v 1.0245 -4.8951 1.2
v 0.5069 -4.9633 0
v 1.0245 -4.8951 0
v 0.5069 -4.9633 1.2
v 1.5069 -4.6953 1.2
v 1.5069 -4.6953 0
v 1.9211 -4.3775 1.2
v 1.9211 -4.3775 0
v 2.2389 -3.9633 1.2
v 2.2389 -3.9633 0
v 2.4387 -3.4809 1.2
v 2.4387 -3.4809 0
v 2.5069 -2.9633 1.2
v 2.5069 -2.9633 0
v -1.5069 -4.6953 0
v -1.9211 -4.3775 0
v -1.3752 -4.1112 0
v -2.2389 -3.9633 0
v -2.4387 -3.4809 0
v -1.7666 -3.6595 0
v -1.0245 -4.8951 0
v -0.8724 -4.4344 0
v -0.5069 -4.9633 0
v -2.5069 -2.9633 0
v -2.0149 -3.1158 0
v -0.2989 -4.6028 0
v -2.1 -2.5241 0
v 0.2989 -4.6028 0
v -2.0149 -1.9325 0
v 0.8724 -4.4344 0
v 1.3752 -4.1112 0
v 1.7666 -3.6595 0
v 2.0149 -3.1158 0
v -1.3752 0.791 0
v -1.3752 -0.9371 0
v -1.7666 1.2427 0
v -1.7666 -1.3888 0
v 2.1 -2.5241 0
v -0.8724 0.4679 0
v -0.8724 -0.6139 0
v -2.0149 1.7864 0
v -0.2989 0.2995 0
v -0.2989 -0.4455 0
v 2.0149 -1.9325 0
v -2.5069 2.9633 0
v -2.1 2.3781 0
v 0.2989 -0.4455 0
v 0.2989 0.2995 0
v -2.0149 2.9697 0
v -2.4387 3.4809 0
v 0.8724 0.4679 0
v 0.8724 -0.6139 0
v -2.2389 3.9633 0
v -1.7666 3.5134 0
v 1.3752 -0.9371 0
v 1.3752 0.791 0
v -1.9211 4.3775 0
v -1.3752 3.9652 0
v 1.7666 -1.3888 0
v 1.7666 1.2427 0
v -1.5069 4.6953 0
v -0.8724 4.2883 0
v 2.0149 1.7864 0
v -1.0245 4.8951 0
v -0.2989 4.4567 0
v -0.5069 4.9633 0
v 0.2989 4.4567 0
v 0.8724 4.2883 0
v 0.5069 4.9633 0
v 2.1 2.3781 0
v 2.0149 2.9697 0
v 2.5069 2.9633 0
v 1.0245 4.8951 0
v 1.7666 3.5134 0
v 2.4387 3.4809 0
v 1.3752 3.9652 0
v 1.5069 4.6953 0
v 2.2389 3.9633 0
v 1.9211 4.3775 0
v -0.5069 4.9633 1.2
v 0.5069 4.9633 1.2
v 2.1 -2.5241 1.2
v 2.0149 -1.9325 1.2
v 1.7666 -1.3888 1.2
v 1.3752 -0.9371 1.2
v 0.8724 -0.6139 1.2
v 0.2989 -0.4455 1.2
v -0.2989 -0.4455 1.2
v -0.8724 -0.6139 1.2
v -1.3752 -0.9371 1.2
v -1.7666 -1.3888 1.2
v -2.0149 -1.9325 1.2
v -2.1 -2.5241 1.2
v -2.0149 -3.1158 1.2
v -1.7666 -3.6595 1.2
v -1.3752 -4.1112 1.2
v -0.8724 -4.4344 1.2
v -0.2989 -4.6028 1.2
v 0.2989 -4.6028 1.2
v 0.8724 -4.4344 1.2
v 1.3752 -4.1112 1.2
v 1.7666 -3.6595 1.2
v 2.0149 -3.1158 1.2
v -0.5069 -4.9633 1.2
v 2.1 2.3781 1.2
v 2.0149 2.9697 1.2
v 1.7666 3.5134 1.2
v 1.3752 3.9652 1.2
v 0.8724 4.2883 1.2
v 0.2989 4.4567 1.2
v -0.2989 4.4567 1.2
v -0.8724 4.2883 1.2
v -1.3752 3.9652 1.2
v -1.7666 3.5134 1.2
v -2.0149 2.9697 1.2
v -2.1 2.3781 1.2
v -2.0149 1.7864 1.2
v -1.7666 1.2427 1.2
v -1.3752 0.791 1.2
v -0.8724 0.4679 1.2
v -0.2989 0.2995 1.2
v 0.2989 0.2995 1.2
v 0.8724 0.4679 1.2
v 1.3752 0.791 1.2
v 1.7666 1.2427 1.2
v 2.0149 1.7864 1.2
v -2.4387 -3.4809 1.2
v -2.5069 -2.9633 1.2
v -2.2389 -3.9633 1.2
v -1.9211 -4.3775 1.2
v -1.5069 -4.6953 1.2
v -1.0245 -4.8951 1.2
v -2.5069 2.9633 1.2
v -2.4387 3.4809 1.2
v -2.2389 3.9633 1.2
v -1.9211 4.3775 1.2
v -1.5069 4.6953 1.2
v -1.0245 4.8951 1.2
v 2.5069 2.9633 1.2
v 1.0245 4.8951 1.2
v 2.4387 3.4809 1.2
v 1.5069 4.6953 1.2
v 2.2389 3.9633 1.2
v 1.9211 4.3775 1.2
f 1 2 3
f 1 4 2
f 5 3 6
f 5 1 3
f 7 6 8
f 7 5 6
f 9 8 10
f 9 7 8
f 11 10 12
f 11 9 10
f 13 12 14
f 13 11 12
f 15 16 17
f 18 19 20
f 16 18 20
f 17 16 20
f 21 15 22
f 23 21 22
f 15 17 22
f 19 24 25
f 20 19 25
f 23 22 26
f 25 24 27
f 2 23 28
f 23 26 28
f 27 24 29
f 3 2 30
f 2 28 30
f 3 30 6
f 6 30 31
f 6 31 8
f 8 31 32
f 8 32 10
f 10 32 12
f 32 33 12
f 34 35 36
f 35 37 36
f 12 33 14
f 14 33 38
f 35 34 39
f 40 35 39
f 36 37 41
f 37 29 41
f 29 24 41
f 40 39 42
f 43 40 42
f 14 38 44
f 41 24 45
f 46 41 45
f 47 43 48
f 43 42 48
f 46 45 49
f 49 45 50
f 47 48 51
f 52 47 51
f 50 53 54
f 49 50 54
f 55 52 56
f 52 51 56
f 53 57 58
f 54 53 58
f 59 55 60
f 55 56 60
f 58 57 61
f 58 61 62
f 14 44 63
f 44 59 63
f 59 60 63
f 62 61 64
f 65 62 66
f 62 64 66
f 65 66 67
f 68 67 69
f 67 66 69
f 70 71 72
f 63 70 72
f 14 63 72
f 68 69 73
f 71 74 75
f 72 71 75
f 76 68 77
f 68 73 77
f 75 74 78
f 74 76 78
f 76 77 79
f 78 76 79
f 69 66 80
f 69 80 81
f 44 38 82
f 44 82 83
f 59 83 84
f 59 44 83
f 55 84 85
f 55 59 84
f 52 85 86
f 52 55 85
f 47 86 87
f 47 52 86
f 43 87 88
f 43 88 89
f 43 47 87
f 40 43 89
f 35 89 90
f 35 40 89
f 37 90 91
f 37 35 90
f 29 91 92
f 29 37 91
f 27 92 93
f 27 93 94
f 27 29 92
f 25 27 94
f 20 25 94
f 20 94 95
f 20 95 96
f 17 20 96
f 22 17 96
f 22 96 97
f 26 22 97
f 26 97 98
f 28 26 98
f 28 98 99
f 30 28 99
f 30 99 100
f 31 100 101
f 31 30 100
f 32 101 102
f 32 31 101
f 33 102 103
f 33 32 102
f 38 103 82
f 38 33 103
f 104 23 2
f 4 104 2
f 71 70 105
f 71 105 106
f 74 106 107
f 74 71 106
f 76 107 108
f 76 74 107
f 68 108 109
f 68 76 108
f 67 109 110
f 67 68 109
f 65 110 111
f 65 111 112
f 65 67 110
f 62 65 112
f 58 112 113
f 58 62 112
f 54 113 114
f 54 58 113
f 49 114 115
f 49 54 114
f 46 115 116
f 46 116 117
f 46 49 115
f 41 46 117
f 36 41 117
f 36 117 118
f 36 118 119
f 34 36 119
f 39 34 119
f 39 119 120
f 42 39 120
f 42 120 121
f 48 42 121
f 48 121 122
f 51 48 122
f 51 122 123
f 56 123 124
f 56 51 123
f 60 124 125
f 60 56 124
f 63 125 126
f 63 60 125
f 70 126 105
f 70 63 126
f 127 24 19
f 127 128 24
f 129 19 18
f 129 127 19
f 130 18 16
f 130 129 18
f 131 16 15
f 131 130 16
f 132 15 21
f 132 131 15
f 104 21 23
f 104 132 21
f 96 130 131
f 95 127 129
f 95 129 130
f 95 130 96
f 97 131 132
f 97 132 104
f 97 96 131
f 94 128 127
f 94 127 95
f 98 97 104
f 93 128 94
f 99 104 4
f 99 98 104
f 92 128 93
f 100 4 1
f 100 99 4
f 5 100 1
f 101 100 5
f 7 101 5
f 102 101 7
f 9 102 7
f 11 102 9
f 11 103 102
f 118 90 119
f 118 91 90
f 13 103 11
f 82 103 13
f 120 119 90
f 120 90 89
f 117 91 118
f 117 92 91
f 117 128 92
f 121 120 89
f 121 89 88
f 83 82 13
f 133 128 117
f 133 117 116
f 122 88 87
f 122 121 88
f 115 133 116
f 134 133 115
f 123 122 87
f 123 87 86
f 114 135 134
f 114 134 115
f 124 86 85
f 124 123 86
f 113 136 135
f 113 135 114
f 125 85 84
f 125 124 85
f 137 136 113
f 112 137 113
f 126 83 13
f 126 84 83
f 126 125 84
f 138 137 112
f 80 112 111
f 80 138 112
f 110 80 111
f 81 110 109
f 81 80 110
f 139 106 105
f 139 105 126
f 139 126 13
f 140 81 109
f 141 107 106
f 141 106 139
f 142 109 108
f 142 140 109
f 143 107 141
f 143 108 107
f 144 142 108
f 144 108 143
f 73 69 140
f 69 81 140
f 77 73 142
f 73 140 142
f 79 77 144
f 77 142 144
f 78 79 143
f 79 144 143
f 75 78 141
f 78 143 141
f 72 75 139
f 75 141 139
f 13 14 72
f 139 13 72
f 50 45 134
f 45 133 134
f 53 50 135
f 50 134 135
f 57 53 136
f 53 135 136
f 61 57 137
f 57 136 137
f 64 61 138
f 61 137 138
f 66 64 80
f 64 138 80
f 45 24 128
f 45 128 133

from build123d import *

# Parameters (mm, degrees)
SKETCH1_W           = 5.013785632
SKETCH1_H           = 9.926537354
SKETCH1_R           = 2.1
BOSS_EXTRUDE2_DEPTH = 1.2
FILLET1_R           = 2


with BuildPart() as part:
    # Sketch1 → Boss-Extrude2 (new body)
    with BuildSketch(Plane.XY):
        Rectangle(SKETCH1_W, SKETCH1_H)
        with Locations((0, 2.378079684)):
            Circle(SKETCH1_R, mode=Mode.SUBTRACT)
        with Locations((0, -2.52414688)):
            Circle(SKETCH1_R, mode=Mode.SUBTRACT)
    extrude(amount=BOSS_EXTRUDE2_DEPTH)

    # Fillet1
    fillet1_edges = [part.edges().sort_by_distance(p)[0] for p in [
        (2.506892816, -4.963268677, 0.6),
        (-2.506892816, -4.963268677, 0.6),
        (-2.506892816, 4.963268677, 0.6),
        (2.506892816, 4.963268677, 0.6),
    ]]
    fillet(fillet1_edges, radius=FILLET1_R)


solid = part.part
